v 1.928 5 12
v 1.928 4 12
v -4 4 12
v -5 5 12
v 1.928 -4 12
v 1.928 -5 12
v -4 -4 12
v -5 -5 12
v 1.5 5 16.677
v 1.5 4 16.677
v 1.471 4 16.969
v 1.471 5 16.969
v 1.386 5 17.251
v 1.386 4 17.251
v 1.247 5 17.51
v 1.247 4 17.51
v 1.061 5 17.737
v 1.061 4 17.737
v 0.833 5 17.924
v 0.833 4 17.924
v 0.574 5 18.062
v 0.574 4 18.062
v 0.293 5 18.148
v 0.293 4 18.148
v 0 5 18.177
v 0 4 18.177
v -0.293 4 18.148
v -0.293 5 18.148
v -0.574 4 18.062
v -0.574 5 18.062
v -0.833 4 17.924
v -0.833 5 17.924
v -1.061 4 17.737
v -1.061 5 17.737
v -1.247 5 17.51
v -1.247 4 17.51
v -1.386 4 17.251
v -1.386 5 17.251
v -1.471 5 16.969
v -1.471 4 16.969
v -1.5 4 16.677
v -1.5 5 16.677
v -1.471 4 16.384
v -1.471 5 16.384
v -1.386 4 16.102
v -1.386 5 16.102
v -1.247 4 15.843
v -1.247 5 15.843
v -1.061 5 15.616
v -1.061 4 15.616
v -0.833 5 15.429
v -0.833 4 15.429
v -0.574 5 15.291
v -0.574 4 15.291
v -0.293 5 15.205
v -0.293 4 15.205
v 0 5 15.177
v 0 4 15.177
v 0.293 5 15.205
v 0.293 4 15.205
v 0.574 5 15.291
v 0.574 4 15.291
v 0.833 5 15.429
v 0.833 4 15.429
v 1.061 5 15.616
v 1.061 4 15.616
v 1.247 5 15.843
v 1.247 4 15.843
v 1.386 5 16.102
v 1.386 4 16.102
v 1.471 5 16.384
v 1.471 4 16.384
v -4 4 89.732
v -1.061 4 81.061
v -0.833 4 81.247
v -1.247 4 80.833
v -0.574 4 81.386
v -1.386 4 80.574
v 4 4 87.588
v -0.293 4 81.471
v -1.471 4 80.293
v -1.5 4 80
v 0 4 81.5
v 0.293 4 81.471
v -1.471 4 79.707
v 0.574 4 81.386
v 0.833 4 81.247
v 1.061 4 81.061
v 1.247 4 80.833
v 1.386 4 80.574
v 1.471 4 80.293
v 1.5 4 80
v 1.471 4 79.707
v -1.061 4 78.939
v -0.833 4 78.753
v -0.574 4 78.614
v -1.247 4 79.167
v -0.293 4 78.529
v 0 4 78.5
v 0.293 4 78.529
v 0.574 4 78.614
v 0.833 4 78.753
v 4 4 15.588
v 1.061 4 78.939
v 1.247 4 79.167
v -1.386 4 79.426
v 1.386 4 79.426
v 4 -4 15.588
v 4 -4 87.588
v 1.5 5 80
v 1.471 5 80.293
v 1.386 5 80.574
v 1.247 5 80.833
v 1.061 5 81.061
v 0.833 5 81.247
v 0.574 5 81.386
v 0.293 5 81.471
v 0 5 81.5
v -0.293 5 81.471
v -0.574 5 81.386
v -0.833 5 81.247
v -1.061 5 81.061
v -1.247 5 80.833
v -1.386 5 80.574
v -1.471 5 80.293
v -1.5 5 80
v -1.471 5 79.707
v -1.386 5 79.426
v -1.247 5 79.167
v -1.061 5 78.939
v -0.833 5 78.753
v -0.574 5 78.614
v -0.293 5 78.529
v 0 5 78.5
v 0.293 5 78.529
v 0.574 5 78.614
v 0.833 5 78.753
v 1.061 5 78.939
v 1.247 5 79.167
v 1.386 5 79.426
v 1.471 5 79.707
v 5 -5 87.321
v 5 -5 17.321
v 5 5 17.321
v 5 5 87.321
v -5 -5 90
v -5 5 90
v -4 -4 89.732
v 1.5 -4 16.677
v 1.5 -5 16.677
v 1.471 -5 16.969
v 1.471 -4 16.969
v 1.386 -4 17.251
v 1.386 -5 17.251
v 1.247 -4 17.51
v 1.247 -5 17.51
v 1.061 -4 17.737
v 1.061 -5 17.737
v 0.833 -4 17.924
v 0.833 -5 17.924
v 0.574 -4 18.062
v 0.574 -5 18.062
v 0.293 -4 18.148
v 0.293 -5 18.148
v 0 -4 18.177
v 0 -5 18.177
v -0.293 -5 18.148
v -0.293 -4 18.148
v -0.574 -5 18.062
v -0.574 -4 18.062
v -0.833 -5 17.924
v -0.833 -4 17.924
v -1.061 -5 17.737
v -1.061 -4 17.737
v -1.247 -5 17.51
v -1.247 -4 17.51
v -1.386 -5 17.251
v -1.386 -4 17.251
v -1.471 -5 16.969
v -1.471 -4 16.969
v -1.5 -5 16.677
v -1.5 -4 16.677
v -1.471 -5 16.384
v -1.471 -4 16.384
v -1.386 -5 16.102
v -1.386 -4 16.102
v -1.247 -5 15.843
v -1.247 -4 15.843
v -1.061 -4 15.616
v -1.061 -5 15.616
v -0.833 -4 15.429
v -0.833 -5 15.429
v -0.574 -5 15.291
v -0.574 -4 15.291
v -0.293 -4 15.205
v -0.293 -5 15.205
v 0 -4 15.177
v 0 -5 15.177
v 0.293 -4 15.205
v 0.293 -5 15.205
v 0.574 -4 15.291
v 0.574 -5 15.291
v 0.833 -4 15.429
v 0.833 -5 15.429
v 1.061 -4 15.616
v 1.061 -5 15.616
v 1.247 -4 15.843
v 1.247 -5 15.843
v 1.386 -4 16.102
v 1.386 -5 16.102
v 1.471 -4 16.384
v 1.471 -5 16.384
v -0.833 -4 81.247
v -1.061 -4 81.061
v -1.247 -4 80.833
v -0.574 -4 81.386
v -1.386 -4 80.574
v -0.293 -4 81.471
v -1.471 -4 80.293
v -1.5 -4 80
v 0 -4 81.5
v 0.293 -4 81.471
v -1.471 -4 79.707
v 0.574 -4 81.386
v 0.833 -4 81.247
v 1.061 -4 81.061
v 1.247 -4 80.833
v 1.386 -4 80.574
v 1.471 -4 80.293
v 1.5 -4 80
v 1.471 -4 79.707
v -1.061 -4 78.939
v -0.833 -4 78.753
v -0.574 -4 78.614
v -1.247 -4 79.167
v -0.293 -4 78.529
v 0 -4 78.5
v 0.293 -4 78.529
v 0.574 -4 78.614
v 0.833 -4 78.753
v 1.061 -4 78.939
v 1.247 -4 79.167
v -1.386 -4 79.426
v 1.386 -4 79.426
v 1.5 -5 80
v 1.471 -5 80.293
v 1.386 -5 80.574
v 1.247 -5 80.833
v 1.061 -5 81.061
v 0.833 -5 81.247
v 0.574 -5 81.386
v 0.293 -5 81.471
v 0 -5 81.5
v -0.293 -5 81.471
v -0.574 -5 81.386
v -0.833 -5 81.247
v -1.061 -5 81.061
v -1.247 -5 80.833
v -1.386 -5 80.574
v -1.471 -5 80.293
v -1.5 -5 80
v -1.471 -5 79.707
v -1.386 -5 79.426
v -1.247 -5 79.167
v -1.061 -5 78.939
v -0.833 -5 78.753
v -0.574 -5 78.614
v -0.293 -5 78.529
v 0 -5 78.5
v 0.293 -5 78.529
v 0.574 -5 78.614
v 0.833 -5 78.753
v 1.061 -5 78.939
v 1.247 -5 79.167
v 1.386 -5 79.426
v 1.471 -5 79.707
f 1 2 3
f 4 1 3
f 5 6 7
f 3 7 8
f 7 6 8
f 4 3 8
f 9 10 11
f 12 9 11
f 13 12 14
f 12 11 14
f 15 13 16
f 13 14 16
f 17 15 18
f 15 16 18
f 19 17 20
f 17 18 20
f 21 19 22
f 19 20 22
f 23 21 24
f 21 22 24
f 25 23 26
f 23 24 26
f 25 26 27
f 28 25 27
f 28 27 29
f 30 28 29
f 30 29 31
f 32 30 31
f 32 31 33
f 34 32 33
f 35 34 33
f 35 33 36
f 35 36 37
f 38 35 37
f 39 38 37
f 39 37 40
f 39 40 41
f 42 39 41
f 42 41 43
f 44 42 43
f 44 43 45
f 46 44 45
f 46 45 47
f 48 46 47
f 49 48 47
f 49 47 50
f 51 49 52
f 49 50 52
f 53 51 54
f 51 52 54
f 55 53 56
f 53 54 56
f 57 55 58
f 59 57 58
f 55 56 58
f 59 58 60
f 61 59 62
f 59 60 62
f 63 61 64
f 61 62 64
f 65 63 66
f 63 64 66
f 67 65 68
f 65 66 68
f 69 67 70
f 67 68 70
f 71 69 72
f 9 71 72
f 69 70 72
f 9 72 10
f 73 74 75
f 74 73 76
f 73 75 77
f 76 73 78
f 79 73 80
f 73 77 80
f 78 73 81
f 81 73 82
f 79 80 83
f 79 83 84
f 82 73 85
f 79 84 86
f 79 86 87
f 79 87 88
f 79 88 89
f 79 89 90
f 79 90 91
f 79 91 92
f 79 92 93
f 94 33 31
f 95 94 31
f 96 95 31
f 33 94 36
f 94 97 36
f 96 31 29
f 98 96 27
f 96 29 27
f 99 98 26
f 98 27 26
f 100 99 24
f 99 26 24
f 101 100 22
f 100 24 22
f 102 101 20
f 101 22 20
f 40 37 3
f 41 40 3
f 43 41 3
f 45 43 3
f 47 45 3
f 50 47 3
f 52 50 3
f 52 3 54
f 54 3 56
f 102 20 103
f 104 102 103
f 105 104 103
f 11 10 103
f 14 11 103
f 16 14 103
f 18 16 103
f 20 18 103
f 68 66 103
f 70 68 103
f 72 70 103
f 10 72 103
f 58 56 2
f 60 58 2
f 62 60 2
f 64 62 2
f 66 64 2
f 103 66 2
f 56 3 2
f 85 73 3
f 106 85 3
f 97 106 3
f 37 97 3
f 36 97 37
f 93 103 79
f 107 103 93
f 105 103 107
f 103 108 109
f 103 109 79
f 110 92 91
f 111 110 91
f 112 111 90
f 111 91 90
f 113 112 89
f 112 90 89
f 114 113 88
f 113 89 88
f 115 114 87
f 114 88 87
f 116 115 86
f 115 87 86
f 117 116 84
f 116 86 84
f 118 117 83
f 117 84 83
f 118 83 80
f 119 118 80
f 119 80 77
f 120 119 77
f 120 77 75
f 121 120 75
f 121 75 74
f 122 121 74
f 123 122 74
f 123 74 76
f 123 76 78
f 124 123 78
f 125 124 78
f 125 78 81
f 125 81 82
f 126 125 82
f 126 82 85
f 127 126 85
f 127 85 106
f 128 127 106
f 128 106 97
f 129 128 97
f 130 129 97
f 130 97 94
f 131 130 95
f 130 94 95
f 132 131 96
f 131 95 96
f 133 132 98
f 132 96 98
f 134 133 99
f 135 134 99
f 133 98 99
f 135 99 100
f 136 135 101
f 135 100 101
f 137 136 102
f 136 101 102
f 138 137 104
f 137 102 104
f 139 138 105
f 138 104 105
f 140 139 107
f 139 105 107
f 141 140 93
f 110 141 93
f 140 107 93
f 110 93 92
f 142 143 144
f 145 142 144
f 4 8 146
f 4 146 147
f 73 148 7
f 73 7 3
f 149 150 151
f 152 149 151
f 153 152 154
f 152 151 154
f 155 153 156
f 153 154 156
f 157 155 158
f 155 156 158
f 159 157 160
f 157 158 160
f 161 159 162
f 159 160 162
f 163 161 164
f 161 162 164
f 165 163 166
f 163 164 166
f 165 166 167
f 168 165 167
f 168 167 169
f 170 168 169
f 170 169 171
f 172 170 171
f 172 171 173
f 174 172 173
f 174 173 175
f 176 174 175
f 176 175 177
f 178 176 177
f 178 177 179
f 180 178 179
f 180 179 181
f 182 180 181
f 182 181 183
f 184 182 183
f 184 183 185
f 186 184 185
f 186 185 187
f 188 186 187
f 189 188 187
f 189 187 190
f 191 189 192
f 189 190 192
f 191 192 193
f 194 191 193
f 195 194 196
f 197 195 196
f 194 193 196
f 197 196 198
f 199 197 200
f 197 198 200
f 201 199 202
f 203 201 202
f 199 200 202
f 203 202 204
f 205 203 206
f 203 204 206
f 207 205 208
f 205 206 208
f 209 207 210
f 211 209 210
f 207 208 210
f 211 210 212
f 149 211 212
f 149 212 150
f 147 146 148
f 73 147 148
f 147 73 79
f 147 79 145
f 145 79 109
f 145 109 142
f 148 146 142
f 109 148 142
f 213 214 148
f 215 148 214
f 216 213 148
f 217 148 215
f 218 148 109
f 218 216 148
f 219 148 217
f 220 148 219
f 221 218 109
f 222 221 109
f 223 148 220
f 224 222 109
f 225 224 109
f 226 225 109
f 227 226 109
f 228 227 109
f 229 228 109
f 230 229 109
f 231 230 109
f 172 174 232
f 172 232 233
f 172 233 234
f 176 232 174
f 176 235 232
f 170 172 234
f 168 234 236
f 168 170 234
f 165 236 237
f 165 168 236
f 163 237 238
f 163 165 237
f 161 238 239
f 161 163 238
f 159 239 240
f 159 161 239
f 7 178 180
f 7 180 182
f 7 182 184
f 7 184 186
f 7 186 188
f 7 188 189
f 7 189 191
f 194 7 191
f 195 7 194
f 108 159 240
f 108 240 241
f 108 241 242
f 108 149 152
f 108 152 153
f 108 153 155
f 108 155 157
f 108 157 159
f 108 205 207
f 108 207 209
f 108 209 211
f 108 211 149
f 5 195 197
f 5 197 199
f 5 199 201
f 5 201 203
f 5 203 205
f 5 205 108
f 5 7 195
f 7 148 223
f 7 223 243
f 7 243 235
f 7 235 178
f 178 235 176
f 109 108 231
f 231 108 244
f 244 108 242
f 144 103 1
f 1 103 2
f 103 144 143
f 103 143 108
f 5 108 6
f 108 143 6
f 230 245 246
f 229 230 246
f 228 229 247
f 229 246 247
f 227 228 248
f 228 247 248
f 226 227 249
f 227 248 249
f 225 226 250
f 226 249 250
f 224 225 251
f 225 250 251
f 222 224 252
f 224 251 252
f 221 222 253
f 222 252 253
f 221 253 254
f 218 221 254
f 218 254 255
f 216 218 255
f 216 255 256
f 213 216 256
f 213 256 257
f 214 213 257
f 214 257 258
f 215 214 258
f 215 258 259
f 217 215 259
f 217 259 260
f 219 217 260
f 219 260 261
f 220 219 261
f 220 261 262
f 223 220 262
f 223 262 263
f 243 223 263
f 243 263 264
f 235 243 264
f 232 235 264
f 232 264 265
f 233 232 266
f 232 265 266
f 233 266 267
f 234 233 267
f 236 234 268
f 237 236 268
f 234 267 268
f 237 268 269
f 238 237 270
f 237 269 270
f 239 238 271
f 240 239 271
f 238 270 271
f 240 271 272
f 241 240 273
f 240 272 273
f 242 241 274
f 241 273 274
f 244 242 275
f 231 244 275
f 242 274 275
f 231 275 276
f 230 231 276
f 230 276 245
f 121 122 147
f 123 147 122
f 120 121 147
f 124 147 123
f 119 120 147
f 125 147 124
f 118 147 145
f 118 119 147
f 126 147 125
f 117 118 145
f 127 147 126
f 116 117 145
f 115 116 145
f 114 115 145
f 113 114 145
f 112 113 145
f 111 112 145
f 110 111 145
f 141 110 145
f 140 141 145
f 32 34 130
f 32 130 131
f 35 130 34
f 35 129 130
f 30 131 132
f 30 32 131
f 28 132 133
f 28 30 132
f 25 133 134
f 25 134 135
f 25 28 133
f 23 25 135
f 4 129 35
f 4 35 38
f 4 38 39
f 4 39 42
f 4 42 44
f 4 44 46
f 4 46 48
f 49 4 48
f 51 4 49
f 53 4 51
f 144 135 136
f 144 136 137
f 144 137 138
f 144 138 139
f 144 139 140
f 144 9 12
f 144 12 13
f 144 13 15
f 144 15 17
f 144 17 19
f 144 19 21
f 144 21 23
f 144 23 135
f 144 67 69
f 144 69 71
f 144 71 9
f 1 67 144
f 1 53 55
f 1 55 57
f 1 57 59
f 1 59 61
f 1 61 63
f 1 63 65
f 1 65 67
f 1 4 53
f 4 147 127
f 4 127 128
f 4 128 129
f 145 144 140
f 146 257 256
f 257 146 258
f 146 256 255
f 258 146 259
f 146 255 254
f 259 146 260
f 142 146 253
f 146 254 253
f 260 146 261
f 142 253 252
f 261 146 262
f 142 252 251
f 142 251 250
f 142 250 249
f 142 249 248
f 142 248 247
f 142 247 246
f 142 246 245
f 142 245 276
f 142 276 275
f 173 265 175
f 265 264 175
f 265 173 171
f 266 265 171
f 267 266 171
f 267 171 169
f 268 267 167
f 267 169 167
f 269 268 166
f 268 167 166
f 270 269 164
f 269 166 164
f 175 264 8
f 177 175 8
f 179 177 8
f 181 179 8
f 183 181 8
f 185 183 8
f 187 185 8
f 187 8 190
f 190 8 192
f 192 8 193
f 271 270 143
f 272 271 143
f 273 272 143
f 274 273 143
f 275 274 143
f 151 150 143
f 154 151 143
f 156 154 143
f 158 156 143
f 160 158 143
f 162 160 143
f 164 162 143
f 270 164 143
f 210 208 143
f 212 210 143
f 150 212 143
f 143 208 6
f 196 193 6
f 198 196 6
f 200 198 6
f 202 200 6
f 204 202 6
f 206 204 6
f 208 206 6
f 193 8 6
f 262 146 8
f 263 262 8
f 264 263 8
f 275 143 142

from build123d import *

# Parameters (mm, degrees)
SKETCH_1_W          = 10
SKETCH_1_H          = 10
SKETCH_1_W_2        = 8
SKETCH_1_H_2        = 8
EXTRUDE_1_DEPTH     = 90
SKETCH_2_R          = 1.5
CUT_EXTRUDE_1_DEPTH = 11


with BuildPart() as part:
    # 草图1 → 拉伸-薄壁1 (new body)
    with BuildSketch(Plane.XY):
        Rectangle(SKETCH_1_W, SKETCH_1_H)
        Rectangle(SKETCH_1_W_2, SKETCH_1_H_2, mode=Mode.SUBTRACT)
    extrude(amount=EXTRUDE_1_DEPTH)

    # 草图2 → 切除-拉伸1 (cut, through all)
    with BuildSketch(Plane.XZ.offset(5)):
        Polygon((1.92820323, 12), (-5, 0), (5, 0), (5, 17.320508076), align=None)
        Polygon((-5, 12), (-5, 0), (1.92820323, 12), align=None)
        with Locations((0, 16.676515813)):
            Circle(SKETCH_2_R)
        Polygon((5, 90), (-5, 90), (5, 87.320508076), align=None)
        with Locations((0, 80)):
            Circle(SKETCH_2_R)
    extrude(amount=-CUT_EXTRUDE_1_DEPTH, mode=Mode.SUBTRACT)


solid = part.part
